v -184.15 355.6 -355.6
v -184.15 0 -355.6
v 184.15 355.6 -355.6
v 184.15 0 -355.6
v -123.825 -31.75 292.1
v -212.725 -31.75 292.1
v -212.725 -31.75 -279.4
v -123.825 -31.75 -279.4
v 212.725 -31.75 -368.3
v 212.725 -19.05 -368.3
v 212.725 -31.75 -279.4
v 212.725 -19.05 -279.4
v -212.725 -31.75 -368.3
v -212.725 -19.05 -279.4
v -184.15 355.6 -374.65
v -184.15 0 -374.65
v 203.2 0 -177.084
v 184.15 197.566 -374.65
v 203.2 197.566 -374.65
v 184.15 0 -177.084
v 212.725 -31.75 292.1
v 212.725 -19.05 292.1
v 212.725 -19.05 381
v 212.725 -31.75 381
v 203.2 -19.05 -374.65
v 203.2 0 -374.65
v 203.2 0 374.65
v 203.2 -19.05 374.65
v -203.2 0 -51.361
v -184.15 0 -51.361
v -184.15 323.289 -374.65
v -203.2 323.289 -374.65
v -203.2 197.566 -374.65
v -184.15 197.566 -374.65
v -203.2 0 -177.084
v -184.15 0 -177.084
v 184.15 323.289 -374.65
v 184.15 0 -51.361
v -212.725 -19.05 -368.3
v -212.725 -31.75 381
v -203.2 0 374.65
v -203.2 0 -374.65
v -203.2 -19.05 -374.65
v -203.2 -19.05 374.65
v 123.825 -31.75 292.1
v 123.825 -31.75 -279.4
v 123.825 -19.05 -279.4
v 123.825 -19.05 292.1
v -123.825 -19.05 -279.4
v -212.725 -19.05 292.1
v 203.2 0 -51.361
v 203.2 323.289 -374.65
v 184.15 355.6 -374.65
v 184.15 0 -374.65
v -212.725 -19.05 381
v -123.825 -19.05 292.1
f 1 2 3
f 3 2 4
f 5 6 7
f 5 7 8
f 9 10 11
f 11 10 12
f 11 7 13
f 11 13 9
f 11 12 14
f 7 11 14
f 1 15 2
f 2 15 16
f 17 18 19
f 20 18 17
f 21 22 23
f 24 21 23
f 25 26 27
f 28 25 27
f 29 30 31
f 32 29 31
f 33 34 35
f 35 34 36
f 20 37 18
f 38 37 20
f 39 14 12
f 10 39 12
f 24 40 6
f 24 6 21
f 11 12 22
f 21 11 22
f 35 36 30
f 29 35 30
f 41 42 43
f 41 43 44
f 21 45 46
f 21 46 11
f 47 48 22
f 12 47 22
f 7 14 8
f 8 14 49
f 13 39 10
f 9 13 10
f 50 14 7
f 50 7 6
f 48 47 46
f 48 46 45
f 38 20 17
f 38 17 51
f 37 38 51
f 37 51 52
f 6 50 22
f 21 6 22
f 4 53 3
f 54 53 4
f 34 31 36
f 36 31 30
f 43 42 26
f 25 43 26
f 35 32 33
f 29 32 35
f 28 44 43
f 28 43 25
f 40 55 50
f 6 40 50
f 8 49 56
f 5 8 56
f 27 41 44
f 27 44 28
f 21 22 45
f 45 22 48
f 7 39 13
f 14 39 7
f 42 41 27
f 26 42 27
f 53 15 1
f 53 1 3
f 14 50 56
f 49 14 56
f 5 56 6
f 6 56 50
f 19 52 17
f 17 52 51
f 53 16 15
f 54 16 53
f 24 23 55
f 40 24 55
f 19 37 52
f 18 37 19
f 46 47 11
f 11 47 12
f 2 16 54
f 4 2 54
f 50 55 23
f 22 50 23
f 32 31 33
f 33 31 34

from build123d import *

# Parameters (mm, degrees)
F0_W     = 406.4
F0_H     = 749.3
F1_DEPTH = 19.05
F2_W     = 368.3
F2_H     = 355.6
F3_DEPTH = 19.05
F5_DEPTH = 19.05
F8_DEPTH = 12.7
F7_W     = 9.525
F7_H     = 88.9
F7_W_2   = 79.375
F7_H_2   = 571.5
F9_DEPTH = 12.7


with BuildPart() as f1:
    # F0 (on Front) → F1 (new body)
    with BuildSketch(Plane.XZ):
        Rectangle(F0_W, F0_H)
    extrude(amount=F1_DEPTH)


with BuildPart() as f3:
    # F2 (on face) → F3 (new body)
    with BuildSketch(Plane(origin=(0, 0, -374.65), x_dir=(1, 0, 0), z_dir=(0, 0, -1))):
        with Locations((0, -177.8)):
            Rectangle(F2_W, F2_H)
    extrude(amount=-F3_DEPTH)


with BuildPart() as f5:
    # F4 (on face) → F5 (new body)
    with BuildSketch(Plane(origin=(-184.15, 0, 0), x_dir=(0, -1, 0), z_dir=(-1, 0, 0))):
        Polygon((0, -51.3607796415), (-323.2892203585, -374.65), (-197.5656346635, -374.65), (0, -177.0843653365), align=None)
    extrude(amount=F5_DEPTH)


with BuildPart() as f6_1:
    # F6: instance of F5
    add(f5.part.mirror(Plane.YZ))


with BuildPart() as f8:
    # F7 (on face) → F8 (new body)
    with BuildSketch(Plane.XZ.offset(19.05)):
        Polygon((-203.2, 374.65), (-203.2, 292.1), (-123.825, 292.1), (123.825, 292.1), (203.2, 292.1), (203.2, 374.65), align=None)
        Polygon((212.725, 381), (-212.725, 381), (-212.725, 292.1), (-203.2, 292.1), (-203.2, 374.65), (203.2, 374.65), (203.2, 292.1), (212.725, 292.1), align=None)
    extrude(amount=F8_DEPTH)


with BuildPart() as f8b:
    # F7 (on face) → F8, piece 2 (new body)
    with BuildSketch(Plane.XZ.offset(19.05)):
        Polygon((-123.825, -279.4), (-203.2, -279.4), (-203.2, -368.3), (203.2, -368.3), (203.2, -279.4), (123.825, -279.4), align=None)
        with Locations((-207.9625, -323.85)):
            Rectangle(F7_W, F7_H)
        with Locations((207.9625, -323.85)):
            Rectangle(F7_W, F7_H)
    extrude(amount=F8_DEPTH)


with BuildPart() as f9:
    # F7 (on face) → F9 (new body)
    with BuildSketch(Plane.XZ.offset(19.05)):
        with Locations((-163.5125, 6.35)):
            Rectangle(F7_W_2, F7_H_2)
        with Locations((-207.9625, 6.35)):
            Rectangle(F7_W, F7_H_2)
    extrude(amount=F9_DEPTH)


with BuildPart() as f9b:
    # F7 (on face) → F9, piece 2 (new body)
    with BuildSketch(Plane.XZ.offset(19.05)):
        with Locations((163.5125, 6.35)):
            Rectangle(F7_W_2, F7_H_2)
        with Locations((207.9625, 6.35)):
            Rectangle(F7_W, F7_H_2)
    extrude(amount=F9_DEPTH)


solid = Compound([f1.part, f3.part, f5.part, f6_1.part, f8.part, f8b.part, f9.part, f9b.part])
